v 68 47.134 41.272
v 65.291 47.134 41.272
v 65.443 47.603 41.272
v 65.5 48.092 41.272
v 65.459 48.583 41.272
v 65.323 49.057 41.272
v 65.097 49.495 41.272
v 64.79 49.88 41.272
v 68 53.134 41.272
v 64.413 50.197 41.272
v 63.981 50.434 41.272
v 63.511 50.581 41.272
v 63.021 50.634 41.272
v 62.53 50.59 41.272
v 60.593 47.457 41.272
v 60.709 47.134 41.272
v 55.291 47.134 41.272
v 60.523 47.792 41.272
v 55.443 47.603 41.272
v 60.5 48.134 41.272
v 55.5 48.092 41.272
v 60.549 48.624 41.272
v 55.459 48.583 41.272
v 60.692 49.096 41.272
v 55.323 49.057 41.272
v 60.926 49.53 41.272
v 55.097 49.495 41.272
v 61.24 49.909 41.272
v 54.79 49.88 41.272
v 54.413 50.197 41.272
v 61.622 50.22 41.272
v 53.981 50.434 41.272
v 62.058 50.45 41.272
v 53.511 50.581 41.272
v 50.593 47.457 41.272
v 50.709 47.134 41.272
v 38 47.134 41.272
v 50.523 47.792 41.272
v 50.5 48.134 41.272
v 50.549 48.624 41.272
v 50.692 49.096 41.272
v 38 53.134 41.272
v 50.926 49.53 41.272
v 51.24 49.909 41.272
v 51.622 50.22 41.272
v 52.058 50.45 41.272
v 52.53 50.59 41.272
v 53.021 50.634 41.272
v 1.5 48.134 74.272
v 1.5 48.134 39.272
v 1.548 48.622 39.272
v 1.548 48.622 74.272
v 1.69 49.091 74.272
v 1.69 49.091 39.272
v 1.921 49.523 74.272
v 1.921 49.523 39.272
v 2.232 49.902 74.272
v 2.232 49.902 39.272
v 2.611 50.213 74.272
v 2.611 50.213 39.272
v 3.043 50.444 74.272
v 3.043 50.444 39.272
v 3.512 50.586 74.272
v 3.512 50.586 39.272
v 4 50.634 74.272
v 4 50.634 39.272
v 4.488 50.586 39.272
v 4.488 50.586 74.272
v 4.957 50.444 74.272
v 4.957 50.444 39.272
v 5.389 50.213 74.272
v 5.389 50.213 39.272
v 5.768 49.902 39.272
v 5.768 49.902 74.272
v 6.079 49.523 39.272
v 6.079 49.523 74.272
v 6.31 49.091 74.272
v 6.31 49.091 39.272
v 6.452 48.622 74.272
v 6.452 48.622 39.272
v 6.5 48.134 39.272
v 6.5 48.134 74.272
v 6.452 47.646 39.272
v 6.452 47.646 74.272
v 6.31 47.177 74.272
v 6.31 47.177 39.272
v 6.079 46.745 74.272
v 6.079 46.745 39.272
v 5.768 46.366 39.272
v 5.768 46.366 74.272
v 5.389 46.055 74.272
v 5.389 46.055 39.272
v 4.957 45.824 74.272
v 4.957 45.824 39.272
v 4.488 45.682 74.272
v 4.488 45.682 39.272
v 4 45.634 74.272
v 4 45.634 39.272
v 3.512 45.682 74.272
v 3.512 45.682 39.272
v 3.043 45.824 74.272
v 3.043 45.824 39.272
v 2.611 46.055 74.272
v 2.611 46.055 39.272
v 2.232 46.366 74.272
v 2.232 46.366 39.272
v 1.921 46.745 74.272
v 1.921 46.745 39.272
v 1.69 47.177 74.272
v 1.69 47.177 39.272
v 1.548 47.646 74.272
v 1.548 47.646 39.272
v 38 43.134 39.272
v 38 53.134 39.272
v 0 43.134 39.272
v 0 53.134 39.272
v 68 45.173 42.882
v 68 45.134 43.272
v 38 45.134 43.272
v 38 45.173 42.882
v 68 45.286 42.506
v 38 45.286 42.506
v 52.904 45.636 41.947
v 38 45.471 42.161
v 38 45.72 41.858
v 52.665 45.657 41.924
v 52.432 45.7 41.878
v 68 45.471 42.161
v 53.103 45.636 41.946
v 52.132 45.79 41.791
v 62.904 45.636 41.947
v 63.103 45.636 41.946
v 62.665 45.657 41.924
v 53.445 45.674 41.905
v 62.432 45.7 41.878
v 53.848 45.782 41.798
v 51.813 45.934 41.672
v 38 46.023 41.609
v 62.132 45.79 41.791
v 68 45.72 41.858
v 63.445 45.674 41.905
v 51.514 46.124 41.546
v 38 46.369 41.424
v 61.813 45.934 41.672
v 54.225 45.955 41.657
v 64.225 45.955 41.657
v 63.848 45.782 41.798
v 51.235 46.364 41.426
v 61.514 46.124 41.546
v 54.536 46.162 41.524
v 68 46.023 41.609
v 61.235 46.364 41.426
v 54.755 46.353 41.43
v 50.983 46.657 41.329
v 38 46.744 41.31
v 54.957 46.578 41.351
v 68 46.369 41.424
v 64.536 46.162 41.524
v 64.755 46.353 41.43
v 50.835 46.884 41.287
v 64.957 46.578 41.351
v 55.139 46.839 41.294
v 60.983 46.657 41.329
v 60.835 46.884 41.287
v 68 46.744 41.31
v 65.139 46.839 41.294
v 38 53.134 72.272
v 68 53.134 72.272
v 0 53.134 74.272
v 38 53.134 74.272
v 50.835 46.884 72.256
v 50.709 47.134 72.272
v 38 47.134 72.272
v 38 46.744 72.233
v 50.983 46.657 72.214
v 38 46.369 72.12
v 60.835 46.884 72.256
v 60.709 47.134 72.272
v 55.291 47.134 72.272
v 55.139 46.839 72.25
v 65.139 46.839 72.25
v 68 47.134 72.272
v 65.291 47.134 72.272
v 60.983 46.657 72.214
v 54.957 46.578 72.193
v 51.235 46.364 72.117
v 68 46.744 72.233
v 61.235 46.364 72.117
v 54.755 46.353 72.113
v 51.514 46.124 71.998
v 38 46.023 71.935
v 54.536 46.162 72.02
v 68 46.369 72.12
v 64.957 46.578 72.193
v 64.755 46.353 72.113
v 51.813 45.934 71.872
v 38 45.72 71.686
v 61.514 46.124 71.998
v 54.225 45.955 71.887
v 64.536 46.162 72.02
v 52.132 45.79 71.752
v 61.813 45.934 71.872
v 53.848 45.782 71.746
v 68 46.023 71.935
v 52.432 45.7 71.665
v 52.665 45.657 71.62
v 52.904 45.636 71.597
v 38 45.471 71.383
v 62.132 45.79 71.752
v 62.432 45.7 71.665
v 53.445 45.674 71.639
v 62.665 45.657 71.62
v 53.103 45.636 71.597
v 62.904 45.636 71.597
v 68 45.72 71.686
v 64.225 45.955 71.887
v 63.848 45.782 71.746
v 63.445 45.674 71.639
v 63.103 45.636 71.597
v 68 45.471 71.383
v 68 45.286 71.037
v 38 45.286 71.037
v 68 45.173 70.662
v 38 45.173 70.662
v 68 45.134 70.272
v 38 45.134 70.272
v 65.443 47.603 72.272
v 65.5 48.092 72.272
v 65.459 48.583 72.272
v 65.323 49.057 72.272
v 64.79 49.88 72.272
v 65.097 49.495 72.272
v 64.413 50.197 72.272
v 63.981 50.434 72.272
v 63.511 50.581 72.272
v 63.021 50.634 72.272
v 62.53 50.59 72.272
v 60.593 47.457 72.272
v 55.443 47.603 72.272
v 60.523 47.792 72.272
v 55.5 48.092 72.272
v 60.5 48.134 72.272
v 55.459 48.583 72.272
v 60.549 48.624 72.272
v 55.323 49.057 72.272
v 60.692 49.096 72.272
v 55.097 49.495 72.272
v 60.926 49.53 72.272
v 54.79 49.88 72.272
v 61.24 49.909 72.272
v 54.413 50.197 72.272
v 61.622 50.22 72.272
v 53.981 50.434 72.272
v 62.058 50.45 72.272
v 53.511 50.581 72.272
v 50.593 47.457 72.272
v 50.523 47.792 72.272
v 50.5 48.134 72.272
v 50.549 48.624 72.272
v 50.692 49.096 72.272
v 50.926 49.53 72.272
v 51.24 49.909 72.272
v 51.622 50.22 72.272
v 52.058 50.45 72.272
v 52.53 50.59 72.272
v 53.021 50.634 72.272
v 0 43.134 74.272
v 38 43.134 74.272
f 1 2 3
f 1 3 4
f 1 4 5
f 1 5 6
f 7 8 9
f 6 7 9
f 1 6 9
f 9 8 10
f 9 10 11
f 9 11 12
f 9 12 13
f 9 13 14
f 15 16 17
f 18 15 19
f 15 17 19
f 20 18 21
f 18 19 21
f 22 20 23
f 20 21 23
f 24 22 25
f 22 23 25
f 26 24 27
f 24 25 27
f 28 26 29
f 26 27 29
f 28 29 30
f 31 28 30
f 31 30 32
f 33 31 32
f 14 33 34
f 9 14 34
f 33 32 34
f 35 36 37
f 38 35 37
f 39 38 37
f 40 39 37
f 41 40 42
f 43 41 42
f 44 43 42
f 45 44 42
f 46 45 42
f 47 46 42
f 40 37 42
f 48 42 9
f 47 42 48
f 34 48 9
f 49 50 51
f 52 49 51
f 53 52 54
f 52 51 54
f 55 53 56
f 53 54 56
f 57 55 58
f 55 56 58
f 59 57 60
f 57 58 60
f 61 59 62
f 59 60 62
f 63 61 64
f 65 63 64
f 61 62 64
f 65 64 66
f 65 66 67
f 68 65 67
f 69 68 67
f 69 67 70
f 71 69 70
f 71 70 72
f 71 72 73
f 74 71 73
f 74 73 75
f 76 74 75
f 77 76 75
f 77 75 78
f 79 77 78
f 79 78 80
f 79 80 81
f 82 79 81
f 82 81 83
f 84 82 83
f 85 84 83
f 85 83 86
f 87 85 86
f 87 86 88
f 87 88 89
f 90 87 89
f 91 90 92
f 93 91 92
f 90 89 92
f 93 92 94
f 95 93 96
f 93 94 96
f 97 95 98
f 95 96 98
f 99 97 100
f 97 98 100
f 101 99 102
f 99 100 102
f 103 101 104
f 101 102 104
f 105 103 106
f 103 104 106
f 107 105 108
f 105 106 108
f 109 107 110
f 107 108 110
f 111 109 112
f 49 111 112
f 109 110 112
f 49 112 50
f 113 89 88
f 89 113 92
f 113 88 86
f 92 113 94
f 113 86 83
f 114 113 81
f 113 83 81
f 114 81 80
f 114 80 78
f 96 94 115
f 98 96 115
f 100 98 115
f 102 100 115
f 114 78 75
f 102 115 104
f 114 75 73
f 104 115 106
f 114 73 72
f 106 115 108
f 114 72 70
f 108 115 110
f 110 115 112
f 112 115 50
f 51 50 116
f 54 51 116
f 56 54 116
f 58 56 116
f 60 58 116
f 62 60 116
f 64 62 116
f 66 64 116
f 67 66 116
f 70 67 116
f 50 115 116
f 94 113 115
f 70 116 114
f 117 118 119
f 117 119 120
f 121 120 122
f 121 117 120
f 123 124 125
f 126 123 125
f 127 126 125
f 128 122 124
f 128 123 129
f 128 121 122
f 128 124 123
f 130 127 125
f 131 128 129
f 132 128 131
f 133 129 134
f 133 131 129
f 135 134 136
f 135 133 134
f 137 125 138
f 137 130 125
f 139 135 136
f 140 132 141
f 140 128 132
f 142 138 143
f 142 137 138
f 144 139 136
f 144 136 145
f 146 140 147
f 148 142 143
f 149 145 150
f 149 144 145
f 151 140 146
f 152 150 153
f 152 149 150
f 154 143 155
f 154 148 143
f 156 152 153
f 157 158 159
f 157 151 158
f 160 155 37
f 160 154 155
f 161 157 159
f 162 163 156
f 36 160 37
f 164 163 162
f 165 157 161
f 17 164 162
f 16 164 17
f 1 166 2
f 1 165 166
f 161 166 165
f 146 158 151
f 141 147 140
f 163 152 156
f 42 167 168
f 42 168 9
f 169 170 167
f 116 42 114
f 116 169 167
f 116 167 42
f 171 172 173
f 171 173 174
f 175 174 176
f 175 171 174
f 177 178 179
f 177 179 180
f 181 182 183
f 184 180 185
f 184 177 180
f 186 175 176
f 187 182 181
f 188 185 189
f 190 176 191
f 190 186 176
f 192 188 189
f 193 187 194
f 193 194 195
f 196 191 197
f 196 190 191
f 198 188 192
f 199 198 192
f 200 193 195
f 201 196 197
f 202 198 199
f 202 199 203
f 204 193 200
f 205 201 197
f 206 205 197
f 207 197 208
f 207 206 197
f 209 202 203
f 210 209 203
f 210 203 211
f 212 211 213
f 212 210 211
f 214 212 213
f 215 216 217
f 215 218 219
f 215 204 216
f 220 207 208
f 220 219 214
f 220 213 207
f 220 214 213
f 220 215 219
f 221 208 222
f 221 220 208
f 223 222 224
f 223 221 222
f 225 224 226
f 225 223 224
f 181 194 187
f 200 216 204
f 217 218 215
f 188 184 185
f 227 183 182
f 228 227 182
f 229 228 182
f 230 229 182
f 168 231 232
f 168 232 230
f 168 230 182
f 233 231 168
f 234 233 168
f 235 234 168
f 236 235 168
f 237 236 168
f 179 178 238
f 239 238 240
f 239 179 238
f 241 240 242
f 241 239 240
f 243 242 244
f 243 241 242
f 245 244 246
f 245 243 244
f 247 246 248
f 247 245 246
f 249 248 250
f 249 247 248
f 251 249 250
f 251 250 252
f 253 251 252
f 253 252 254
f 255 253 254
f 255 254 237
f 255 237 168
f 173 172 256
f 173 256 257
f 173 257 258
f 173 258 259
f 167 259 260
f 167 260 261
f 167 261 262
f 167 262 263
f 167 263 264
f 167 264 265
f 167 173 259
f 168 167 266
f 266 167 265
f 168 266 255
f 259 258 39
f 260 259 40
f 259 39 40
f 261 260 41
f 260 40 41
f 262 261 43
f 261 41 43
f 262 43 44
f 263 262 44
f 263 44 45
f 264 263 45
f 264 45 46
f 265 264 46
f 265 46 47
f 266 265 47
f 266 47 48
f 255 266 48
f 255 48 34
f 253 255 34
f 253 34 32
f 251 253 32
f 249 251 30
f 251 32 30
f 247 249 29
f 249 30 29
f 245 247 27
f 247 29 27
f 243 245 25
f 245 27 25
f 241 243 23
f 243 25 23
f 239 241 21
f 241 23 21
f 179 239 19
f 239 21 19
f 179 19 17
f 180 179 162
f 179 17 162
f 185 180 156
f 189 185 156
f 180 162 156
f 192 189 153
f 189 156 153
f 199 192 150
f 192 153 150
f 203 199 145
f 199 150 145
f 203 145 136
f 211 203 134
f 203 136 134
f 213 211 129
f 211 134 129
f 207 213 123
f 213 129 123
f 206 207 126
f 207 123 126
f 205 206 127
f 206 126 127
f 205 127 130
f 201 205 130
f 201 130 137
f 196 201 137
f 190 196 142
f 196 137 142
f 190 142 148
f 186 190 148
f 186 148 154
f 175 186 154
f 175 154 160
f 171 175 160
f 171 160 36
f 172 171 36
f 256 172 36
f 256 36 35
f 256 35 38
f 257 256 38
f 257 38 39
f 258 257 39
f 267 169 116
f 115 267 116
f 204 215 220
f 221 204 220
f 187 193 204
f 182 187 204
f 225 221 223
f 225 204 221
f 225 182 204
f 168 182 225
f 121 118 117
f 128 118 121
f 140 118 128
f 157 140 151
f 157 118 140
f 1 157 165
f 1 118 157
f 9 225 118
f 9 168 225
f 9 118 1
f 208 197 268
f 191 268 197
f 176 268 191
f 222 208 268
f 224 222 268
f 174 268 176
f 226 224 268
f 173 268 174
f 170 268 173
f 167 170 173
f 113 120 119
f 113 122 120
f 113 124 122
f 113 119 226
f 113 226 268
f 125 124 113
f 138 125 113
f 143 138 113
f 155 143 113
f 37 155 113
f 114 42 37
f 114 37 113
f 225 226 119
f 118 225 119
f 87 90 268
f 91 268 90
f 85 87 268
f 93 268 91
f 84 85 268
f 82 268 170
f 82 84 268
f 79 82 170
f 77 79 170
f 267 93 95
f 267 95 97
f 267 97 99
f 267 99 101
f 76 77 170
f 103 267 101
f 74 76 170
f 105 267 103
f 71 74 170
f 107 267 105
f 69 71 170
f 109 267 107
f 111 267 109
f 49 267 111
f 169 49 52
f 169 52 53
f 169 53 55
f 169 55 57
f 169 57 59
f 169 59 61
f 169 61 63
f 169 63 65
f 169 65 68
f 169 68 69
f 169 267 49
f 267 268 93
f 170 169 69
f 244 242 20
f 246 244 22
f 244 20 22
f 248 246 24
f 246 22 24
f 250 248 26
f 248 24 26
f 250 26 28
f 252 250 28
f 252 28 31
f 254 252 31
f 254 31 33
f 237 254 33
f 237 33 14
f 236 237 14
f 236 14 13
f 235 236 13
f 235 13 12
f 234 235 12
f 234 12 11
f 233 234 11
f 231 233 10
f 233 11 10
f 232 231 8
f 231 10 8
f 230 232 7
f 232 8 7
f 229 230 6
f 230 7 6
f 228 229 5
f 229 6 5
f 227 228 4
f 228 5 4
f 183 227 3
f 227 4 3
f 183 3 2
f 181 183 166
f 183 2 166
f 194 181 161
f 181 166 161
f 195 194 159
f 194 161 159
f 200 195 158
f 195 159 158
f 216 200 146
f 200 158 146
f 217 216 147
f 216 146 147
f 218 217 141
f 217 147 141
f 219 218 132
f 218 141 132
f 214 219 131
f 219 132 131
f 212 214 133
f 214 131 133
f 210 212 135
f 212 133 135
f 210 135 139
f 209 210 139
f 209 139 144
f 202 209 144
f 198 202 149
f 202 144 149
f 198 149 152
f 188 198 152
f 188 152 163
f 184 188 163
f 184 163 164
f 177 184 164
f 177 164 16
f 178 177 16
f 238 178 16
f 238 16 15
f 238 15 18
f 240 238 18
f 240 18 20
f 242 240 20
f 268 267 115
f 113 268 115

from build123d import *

# Parameters (mm, degrees)
SKETCH1_W      = 35
SKETCH1_H      = 10
EXTRUDE1_DEPTH = 38
SKETCH2_W      = 31
SKETCH2_H      = 8
EXTRUDE2_DEPTH = 30
FILLET1_R      = 2
SKETCH3_R      = 2.5
EXTRUDE3_DEPTH = 34
SKETCH4_R      = 2.5
EXTRUDE4_DEPTH = 36


with BuildPart() as part:
    # Sketch1 → Extrude1 (new body)
    with BuildSketch(Plane(origin=(0, 0, 0), x_dir=(0, 0, -1), z_dir=(1, 0, 0))):
        with Locations((-56.771768295, 48.134111791)):
            Rectangle(SKETCH1_W, SKETCH1_H)
    extrude(amount=EXTRUDE1_DEPTH)

    # Sketch2 → Extrude2 (add)
    with BuildSketch(Plane(origin=(38, 0, 0), x_dir=(0, 0, -1), z_dir=(1, 0, 0))):
        with Locations((-56.771768295, 49.134111791)):
            Rectangle(SKETCH2_W, SKETCH2_H)
    extrude(amount=EXTRUDE2_DEPTH)

    # Fillet1
    fillet1_edges = [part.edges().sort_by_distance(p)[0] for p in [
        (53, 45.134111791, 72.271768295),
        (53, 45.134111791, 41.271768295),
    ]]
    fillet(fillet1_edges, radius=FILLET1_R)

    # Sketch3 → Extrude3 (cut, through all)
    with BuildSketch(Plane(origin=(0, 0, 41.271768295), x_dir=(-1, 0, 0), z_dir=(0, 0, -1))):
        with Locations((-63, 48.134111791)):
            Circle(SKETCH3_R)
        with Locations((-53, 48.134111791)):
            Circle(SKETCH3_R)
    extrude(amount=-EXTRUDE3_DEPTH, mode=Mode.SUBTRACT)

    # Sketch4 → Extrude4 (cut, through all)
    with BuildSketch(Plane(origin=(0, 0, 39.271768295), x_dir=(-1, 0, 0), z_dir=(0, 0, -1))):
        with Locations((-4, 48.134111791)):
            Circle(SKETCH4_R)
    extrude(amount=-EXTRUDE4_DEPTH, mode=Mode.SUBTRACT)


solid = part.part
